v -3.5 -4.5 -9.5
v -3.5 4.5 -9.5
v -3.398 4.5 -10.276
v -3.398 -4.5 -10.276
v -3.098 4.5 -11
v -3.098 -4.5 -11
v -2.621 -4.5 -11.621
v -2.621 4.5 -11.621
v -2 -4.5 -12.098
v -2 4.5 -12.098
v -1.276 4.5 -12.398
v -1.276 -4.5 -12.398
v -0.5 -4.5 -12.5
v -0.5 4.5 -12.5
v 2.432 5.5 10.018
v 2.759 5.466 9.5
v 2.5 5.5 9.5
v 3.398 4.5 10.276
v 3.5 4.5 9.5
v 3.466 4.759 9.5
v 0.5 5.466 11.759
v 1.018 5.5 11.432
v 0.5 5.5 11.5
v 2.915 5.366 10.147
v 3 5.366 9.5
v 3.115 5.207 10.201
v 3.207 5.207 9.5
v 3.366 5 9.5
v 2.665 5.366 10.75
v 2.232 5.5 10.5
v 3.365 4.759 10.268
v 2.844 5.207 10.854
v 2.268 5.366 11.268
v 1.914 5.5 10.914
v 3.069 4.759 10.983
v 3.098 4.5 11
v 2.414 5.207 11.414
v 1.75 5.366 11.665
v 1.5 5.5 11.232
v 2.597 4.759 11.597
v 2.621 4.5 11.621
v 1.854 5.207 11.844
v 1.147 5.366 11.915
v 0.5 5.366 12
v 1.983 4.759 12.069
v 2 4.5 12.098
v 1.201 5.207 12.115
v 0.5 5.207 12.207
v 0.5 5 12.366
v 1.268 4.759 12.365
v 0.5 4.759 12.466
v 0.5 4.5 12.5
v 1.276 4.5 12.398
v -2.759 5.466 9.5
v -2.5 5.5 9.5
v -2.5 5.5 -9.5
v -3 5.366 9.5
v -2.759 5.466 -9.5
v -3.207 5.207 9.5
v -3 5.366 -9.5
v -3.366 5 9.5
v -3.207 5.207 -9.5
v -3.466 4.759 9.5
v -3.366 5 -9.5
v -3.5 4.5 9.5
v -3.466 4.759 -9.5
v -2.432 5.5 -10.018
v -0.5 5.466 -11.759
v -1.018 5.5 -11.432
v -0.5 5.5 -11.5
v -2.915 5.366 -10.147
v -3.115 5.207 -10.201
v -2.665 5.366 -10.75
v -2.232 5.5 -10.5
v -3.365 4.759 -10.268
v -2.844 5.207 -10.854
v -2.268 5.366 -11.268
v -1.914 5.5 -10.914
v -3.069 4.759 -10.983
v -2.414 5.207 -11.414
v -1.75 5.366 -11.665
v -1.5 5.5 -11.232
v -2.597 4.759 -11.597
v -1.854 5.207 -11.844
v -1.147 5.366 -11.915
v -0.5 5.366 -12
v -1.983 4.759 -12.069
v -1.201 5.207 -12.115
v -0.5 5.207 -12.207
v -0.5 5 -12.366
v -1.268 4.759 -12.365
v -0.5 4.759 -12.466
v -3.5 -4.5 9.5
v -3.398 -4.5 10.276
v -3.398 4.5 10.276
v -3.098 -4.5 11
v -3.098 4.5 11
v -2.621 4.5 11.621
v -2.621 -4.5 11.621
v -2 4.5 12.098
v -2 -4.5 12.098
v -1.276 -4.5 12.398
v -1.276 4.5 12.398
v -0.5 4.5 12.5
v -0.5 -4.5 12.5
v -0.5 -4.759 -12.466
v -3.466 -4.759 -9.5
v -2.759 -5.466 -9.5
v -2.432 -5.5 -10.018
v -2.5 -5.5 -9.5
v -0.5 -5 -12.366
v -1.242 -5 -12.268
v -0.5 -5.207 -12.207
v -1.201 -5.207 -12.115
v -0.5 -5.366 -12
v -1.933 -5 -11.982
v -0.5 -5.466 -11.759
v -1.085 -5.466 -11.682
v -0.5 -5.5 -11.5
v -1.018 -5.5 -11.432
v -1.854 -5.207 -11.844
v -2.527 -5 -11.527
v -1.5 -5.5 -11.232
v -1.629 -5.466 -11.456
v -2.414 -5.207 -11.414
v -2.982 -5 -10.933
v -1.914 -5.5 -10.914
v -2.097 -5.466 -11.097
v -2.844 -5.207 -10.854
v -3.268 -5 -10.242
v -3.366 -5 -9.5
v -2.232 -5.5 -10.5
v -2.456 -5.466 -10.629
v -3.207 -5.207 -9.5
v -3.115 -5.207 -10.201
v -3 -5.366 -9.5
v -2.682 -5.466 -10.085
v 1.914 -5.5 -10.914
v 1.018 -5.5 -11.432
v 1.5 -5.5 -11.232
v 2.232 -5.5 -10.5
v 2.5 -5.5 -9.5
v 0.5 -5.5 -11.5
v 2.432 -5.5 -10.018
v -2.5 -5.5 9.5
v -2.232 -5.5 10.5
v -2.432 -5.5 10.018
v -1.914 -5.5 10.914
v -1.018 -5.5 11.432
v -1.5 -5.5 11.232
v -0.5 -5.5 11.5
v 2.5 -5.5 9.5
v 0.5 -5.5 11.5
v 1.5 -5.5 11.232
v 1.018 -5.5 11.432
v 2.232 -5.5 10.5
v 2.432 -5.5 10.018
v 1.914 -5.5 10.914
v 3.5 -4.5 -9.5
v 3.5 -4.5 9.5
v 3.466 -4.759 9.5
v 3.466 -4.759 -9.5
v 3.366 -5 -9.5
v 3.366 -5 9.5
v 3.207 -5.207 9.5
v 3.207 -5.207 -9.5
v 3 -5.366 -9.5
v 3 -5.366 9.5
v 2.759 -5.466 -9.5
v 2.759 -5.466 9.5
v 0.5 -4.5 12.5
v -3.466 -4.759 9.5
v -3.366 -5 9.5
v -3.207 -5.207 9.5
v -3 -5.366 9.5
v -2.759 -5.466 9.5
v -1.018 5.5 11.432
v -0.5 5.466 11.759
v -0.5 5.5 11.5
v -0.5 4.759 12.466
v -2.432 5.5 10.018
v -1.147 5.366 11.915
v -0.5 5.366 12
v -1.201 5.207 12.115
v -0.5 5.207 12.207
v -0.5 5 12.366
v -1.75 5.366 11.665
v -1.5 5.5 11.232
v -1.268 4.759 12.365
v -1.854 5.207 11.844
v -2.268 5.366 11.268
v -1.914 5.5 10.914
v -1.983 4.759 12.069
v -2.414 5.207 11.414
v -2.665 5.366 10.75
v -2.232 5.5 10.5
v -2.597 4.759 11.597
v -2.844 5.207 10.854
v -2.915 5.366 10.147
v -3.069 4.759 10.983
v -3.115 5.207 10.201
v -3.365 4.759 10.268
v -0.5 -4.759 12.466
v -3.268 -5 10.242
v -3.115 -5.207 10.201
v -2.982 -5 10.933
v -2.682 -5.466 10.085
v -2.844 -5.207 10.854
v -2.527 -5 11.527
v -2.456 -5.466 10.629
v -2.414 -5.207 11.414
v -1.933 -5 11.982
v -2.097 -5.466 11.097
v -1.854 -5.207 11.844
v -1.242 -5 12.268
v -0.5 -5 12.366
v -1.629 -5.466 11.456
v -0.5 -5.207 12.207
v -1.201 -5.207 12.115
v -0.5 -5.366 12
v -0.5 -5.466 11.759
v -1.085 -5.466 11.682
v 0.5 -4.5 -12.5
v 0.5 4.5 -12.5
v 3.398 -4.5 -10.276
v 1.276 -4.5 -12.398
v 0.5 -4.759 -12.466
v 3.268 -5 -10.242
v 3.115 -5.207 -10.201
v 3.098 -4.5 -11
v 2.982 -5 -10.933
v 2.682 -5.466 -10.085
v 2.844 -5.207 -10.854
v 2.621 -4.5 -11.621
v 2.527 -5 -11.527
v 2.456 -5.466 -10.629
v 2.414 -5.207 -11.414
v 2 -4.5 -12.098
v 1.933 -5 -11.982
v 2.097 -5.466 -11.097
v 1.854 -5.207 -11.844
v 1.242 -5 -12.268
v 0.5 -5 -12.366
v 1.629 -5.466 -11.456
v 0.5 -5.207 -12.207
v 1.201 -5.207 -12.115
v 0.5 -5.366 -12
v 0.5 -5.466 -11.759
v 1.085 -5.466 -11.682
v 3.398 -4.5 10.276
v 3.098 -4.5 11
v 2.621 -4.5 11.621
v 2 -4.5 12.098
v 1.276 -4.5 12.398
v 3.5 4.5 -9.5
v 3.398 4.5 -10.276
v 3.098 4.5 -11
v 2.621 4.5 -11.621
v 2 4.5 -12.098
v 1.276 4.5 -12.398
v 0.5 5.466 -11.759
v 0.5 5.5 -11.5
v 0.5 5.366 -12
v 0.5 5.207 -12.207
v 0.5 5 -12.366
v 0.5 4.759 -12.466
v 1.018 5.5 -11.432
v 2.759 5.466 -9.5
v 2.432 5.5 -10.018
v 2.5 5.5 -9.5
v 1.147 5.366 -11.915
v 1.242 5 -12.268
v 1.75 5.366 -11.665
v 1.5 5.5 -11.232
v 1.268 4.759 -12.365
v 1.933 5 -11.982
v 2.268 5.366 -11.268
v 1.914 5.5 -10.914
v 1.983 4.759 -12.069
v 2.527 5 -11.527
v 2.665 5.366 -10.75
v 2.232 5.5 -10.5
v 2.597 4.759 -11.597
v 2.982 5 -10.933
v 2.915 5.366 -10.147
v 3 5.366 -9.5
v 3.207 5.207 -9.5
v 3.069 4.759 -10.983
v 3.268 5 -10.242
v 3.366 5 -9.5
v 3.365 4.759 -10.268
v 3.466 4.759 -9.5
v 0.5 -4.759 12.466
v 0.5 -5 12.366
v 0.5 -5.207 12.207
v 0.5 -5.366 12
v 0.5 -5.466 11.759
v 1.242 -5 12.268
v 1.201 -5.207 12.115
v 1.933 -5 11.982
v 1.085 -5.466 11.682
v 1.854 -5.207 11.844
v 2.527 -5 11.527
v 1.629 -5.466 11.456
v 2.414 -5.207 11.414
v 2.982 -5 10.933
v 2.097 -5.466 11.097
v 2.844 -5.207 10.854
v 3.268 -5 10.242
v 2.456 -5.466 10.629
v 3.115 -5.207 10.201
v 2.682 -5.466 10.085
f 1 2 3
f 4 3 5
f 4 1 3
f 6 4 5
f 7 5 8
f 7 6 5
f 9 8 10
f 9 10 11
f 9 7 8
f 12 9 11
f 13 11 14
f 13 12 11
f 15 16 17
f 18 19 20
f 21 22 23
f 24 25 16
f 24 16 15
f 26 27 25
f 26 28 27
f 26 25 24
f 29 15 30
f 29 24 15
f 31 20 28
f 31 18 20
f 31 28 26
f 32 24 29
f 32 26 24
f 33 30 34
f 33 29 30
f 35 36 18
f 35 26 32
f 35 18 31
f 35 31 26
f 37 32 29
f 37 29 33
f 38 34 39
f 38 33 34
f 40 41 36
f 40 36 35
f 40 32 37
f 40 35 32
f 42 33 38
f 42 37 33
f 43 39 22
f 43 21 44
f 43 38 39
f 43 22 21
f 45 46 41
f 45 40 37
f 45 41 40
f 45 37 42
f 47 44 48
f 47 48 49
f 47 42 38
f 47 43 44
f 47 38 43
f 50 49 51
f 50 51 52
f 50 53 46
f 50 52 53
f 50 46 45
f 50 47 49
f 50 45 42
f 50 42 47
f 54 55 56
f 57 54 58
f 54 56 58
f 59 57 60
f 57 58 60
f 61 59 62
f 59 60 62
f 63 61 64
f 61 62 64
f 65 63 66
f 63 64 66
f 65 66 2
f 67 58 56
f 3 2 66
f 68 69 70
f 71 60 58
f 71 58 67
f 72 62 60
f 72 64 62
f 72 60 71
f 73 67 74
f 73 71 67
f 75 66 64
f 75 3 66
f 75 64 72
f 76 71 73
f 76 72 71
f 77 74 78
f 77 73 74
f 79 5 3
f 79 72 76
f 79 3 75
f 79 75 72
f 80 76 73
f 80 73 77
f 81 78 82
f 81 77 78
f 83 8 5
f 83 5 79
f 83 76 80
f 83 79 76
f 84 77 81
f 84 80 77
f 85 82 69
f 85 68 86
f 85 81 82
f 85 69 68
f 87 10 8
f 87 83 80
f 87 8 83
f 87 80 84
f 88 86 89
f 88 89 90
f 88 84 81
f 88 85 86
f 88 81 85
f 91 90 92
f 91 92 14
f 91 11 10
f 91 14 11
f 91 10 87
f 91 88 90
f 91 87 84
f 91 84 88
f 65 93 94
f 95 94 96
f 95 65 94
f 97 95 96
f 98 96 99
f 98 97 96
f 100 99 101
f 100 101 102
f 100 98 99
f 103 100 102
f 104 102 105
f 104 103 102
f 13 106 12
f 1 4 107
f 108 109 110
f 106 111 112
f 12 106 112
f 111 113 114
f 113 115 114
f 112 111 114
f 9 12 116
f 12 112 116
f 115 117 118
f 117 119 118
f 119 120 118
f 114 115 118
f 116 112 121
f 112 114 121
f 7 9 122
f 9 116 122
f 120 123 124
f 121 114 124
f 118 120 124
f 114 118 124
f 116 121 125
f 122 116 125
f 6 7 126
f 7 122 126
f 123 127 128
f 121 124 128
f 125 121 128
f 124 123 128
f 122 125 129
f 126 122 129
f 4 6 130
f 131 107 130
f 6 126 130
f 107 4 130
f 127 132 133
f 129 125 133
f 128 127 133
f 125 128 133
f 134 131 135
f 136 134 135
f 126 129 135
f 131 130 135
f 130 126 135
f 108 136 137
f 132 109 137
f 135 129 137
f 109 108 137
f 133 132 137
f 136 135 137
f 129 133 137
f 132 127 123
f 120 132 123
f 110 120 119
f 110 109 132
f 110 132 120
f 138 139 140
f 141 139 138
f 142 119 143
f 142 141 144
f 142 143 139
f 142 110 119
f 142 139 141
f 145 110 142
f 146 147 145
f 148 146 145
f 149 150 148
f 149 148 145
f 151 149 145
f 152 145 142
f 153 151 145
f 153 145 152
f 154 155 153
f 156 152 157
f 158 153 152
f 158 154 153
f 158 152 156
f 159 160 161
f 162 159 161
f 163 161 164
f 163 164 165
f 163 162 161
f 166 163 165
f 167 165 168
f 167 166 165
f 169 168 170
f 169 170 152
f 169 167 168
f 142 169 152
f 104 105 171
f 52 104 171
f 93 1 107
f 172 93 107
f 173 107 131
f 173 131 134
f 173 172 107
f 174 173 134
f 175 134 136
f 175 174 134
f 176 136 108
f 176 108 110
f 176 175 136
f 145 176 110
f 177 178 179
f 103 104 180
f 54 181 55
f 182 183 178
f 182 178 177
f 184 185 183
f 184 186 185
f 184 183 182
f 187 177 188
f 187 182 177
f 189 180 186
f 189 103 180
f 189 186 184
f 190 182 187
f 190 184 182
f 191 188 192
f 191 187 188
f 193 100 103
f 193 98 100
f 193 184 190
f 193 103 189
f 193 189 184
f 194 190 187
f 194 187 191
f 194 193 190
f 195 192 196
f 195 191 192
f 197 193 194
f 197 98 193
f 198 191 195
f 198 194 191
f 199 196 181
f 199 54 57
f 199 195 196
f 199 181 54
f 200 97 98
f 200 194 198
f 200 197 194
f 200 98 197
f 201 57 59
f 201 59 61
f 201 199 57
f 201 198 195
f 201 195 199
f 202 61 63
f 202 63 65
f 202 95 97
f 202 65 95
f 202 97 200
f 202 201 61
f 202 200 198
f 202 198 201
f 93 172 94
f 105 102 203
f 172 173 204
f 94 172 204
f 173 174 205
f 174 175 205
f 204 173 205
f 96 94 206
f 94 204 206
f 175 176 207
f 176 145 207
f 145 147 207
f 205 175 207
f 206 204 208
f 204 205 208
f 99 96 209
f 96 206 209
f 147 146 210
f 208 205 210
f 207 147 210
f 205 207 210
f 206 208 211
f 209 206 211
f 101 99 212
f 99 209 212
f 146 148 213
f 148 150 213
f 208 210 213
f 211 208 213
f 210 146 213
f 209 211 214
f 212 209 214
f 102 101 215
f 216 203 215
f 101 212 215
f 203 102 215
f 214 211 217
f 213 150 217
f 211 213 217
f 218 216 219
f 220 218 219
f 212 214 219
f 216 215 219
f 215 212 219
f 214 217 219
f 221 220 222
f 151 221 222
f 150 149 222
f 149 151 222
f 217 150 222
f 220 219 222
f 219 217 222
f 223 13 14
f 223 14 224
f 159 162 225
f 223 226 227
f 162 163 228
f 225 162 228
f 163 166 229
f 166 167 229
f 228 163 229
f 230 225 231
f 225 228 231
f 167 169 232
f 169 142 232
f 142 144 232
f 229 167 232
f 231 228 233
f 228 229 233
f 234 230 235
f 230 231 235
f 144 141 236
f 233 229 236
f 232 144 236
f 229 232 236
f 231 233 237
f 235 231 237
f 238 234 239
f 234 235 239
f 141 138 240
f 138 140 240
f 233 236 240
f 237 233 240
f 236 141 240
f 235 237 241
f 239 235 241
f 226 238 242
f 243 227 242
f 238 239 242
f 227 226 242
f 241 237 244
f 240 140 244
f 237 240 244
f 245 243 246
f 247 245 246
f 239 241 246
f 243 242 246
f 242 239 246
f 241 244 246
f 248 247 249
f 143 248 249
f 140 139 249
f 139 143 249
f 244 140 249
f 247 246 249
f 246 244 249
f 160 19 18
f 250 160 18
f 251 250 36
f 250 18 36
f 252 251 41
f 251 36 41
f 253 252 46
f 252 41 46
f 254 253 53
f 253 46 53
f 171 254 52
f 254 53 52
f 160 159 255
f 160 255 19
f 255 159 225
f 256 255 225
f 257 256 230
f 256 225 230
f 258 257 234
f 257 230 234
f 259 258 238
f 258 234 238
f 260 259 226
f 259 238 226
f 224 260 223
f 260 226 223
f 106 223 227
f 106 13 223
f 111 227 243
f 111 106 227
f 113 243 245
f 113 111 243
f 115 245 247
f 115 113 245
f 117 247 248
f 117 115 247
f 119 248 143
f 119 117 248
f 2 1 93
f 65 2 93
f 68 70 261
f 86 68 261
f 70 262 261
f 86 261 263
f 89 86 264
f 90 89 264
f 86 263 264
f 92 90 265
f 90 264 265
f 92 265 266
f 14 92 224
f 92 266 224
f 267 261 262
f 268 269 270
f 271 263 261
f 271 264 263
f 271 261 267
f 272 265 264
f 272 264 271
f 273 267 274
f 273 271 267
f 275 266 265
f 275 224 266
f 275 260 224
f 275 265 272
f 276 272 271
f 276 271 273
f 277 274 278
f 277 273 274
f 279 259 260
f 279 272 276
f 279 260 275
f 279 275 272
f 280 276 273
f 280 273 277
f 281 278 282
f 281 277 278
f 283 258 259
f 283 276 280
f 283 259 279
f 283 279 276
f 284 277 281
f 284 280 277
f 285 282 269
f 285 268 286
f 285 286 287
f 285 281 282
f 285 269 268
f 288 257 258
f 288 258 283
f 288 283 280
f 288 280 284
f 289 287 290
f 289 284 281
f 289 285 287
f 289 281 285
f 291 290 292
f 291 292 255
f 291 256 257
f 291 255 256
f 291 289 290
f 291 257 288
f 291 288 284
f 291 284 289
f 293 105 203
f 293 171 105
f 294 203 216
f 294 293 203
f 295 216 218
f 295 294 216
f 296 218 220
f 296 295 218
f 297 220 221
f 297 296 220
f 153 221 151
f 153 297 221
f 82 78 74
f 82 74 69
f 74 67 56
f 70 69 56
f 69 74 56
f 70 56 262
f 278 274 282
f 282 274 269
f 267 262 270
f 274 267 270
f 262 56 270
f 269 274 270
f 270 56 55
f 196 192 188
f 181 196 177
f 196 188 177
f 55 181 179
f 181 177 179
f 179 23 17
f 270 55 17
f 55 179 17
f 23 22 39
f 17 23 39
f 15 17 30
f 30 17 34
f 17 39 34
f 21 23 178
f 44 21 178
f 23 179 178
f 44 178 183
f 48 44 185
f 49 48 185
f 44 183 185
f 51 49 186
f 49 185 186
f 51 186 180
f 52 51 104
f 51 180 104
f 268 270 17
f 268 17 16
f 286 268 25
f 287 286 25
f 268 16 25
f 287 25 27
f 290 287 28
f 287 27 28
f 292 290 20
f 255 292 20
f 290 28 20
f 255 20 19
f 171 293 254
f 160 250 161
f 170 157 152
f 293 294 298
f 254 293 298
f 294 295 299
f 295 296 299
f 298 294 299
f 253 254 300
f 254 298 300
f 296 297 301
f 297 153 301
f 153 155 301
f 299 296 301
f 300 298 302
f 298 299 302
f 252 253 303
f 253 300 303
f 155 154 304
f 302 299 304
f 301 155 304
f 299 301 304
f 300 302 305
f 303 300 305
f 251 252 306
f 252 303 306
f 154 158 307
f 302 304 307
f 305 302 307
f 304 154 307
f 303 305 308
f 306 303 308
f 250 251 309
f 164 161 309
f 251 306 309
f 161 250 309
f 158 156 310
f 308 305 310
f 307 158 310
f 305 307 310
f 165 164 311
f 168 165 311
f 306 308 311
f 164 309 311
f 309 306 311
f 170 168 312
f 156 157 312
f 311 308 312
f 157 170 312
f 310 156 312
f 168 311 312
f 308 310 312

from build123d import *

# Parameters (mm, degrees)
F0_W     = 7
F0_H     = 25
F1_DEPTH = 5.5
F2_R     = 3
F3_R     = 1


with BuildPart() as f1:
    # F0 (on Front) → F1 (new body, symmetric)
    with BuildSketch(Plane.XZ):
        Rectangle(F0_W, F0_H)
    extrude(amount=F1_DEPTH, both=True)

    # F2
    f2_edges = [f1.edges().sort_by_distance(p)[0] for p in [
        (3.5, 0, 12.5),
        (-3.5, 0, 12.5),
        (3.5, 0, -12.5),
        (-3.5, 0, -12.5),
    ]]
    fillet(f2_edges, radius=F2_R)

    # F3
    f3_edges = [f1.edges().sort_by_distance(p)[0] for p in [
        (-3.5, -5.5, 0),
        (3.5, -5.5, 0),
        (-2.62132, -5.5, -11.62132),
        (2.62132, -5.5, 11.62132),
        (0, -5.5, -12.5),
        (-2.62132, -5.5, 11.62132),
        (0, -5.5, 12.5),
        (3.5, 5.5, 0),
        (-3.5, 5.5, 0),
        (0, 5.5, -12.5),
        (-2.62132, 5.5, -11.62132),
        (2.62132, 5.5, -11.62132),
        (-2.62132, 5.5, 11.62132),
        (2.62132, 5.5, 11.62132),
        (0, 5.5, 12.5),
    ]]
    fillet(f3_edges, radius=F3_R)


solid = f1.part
